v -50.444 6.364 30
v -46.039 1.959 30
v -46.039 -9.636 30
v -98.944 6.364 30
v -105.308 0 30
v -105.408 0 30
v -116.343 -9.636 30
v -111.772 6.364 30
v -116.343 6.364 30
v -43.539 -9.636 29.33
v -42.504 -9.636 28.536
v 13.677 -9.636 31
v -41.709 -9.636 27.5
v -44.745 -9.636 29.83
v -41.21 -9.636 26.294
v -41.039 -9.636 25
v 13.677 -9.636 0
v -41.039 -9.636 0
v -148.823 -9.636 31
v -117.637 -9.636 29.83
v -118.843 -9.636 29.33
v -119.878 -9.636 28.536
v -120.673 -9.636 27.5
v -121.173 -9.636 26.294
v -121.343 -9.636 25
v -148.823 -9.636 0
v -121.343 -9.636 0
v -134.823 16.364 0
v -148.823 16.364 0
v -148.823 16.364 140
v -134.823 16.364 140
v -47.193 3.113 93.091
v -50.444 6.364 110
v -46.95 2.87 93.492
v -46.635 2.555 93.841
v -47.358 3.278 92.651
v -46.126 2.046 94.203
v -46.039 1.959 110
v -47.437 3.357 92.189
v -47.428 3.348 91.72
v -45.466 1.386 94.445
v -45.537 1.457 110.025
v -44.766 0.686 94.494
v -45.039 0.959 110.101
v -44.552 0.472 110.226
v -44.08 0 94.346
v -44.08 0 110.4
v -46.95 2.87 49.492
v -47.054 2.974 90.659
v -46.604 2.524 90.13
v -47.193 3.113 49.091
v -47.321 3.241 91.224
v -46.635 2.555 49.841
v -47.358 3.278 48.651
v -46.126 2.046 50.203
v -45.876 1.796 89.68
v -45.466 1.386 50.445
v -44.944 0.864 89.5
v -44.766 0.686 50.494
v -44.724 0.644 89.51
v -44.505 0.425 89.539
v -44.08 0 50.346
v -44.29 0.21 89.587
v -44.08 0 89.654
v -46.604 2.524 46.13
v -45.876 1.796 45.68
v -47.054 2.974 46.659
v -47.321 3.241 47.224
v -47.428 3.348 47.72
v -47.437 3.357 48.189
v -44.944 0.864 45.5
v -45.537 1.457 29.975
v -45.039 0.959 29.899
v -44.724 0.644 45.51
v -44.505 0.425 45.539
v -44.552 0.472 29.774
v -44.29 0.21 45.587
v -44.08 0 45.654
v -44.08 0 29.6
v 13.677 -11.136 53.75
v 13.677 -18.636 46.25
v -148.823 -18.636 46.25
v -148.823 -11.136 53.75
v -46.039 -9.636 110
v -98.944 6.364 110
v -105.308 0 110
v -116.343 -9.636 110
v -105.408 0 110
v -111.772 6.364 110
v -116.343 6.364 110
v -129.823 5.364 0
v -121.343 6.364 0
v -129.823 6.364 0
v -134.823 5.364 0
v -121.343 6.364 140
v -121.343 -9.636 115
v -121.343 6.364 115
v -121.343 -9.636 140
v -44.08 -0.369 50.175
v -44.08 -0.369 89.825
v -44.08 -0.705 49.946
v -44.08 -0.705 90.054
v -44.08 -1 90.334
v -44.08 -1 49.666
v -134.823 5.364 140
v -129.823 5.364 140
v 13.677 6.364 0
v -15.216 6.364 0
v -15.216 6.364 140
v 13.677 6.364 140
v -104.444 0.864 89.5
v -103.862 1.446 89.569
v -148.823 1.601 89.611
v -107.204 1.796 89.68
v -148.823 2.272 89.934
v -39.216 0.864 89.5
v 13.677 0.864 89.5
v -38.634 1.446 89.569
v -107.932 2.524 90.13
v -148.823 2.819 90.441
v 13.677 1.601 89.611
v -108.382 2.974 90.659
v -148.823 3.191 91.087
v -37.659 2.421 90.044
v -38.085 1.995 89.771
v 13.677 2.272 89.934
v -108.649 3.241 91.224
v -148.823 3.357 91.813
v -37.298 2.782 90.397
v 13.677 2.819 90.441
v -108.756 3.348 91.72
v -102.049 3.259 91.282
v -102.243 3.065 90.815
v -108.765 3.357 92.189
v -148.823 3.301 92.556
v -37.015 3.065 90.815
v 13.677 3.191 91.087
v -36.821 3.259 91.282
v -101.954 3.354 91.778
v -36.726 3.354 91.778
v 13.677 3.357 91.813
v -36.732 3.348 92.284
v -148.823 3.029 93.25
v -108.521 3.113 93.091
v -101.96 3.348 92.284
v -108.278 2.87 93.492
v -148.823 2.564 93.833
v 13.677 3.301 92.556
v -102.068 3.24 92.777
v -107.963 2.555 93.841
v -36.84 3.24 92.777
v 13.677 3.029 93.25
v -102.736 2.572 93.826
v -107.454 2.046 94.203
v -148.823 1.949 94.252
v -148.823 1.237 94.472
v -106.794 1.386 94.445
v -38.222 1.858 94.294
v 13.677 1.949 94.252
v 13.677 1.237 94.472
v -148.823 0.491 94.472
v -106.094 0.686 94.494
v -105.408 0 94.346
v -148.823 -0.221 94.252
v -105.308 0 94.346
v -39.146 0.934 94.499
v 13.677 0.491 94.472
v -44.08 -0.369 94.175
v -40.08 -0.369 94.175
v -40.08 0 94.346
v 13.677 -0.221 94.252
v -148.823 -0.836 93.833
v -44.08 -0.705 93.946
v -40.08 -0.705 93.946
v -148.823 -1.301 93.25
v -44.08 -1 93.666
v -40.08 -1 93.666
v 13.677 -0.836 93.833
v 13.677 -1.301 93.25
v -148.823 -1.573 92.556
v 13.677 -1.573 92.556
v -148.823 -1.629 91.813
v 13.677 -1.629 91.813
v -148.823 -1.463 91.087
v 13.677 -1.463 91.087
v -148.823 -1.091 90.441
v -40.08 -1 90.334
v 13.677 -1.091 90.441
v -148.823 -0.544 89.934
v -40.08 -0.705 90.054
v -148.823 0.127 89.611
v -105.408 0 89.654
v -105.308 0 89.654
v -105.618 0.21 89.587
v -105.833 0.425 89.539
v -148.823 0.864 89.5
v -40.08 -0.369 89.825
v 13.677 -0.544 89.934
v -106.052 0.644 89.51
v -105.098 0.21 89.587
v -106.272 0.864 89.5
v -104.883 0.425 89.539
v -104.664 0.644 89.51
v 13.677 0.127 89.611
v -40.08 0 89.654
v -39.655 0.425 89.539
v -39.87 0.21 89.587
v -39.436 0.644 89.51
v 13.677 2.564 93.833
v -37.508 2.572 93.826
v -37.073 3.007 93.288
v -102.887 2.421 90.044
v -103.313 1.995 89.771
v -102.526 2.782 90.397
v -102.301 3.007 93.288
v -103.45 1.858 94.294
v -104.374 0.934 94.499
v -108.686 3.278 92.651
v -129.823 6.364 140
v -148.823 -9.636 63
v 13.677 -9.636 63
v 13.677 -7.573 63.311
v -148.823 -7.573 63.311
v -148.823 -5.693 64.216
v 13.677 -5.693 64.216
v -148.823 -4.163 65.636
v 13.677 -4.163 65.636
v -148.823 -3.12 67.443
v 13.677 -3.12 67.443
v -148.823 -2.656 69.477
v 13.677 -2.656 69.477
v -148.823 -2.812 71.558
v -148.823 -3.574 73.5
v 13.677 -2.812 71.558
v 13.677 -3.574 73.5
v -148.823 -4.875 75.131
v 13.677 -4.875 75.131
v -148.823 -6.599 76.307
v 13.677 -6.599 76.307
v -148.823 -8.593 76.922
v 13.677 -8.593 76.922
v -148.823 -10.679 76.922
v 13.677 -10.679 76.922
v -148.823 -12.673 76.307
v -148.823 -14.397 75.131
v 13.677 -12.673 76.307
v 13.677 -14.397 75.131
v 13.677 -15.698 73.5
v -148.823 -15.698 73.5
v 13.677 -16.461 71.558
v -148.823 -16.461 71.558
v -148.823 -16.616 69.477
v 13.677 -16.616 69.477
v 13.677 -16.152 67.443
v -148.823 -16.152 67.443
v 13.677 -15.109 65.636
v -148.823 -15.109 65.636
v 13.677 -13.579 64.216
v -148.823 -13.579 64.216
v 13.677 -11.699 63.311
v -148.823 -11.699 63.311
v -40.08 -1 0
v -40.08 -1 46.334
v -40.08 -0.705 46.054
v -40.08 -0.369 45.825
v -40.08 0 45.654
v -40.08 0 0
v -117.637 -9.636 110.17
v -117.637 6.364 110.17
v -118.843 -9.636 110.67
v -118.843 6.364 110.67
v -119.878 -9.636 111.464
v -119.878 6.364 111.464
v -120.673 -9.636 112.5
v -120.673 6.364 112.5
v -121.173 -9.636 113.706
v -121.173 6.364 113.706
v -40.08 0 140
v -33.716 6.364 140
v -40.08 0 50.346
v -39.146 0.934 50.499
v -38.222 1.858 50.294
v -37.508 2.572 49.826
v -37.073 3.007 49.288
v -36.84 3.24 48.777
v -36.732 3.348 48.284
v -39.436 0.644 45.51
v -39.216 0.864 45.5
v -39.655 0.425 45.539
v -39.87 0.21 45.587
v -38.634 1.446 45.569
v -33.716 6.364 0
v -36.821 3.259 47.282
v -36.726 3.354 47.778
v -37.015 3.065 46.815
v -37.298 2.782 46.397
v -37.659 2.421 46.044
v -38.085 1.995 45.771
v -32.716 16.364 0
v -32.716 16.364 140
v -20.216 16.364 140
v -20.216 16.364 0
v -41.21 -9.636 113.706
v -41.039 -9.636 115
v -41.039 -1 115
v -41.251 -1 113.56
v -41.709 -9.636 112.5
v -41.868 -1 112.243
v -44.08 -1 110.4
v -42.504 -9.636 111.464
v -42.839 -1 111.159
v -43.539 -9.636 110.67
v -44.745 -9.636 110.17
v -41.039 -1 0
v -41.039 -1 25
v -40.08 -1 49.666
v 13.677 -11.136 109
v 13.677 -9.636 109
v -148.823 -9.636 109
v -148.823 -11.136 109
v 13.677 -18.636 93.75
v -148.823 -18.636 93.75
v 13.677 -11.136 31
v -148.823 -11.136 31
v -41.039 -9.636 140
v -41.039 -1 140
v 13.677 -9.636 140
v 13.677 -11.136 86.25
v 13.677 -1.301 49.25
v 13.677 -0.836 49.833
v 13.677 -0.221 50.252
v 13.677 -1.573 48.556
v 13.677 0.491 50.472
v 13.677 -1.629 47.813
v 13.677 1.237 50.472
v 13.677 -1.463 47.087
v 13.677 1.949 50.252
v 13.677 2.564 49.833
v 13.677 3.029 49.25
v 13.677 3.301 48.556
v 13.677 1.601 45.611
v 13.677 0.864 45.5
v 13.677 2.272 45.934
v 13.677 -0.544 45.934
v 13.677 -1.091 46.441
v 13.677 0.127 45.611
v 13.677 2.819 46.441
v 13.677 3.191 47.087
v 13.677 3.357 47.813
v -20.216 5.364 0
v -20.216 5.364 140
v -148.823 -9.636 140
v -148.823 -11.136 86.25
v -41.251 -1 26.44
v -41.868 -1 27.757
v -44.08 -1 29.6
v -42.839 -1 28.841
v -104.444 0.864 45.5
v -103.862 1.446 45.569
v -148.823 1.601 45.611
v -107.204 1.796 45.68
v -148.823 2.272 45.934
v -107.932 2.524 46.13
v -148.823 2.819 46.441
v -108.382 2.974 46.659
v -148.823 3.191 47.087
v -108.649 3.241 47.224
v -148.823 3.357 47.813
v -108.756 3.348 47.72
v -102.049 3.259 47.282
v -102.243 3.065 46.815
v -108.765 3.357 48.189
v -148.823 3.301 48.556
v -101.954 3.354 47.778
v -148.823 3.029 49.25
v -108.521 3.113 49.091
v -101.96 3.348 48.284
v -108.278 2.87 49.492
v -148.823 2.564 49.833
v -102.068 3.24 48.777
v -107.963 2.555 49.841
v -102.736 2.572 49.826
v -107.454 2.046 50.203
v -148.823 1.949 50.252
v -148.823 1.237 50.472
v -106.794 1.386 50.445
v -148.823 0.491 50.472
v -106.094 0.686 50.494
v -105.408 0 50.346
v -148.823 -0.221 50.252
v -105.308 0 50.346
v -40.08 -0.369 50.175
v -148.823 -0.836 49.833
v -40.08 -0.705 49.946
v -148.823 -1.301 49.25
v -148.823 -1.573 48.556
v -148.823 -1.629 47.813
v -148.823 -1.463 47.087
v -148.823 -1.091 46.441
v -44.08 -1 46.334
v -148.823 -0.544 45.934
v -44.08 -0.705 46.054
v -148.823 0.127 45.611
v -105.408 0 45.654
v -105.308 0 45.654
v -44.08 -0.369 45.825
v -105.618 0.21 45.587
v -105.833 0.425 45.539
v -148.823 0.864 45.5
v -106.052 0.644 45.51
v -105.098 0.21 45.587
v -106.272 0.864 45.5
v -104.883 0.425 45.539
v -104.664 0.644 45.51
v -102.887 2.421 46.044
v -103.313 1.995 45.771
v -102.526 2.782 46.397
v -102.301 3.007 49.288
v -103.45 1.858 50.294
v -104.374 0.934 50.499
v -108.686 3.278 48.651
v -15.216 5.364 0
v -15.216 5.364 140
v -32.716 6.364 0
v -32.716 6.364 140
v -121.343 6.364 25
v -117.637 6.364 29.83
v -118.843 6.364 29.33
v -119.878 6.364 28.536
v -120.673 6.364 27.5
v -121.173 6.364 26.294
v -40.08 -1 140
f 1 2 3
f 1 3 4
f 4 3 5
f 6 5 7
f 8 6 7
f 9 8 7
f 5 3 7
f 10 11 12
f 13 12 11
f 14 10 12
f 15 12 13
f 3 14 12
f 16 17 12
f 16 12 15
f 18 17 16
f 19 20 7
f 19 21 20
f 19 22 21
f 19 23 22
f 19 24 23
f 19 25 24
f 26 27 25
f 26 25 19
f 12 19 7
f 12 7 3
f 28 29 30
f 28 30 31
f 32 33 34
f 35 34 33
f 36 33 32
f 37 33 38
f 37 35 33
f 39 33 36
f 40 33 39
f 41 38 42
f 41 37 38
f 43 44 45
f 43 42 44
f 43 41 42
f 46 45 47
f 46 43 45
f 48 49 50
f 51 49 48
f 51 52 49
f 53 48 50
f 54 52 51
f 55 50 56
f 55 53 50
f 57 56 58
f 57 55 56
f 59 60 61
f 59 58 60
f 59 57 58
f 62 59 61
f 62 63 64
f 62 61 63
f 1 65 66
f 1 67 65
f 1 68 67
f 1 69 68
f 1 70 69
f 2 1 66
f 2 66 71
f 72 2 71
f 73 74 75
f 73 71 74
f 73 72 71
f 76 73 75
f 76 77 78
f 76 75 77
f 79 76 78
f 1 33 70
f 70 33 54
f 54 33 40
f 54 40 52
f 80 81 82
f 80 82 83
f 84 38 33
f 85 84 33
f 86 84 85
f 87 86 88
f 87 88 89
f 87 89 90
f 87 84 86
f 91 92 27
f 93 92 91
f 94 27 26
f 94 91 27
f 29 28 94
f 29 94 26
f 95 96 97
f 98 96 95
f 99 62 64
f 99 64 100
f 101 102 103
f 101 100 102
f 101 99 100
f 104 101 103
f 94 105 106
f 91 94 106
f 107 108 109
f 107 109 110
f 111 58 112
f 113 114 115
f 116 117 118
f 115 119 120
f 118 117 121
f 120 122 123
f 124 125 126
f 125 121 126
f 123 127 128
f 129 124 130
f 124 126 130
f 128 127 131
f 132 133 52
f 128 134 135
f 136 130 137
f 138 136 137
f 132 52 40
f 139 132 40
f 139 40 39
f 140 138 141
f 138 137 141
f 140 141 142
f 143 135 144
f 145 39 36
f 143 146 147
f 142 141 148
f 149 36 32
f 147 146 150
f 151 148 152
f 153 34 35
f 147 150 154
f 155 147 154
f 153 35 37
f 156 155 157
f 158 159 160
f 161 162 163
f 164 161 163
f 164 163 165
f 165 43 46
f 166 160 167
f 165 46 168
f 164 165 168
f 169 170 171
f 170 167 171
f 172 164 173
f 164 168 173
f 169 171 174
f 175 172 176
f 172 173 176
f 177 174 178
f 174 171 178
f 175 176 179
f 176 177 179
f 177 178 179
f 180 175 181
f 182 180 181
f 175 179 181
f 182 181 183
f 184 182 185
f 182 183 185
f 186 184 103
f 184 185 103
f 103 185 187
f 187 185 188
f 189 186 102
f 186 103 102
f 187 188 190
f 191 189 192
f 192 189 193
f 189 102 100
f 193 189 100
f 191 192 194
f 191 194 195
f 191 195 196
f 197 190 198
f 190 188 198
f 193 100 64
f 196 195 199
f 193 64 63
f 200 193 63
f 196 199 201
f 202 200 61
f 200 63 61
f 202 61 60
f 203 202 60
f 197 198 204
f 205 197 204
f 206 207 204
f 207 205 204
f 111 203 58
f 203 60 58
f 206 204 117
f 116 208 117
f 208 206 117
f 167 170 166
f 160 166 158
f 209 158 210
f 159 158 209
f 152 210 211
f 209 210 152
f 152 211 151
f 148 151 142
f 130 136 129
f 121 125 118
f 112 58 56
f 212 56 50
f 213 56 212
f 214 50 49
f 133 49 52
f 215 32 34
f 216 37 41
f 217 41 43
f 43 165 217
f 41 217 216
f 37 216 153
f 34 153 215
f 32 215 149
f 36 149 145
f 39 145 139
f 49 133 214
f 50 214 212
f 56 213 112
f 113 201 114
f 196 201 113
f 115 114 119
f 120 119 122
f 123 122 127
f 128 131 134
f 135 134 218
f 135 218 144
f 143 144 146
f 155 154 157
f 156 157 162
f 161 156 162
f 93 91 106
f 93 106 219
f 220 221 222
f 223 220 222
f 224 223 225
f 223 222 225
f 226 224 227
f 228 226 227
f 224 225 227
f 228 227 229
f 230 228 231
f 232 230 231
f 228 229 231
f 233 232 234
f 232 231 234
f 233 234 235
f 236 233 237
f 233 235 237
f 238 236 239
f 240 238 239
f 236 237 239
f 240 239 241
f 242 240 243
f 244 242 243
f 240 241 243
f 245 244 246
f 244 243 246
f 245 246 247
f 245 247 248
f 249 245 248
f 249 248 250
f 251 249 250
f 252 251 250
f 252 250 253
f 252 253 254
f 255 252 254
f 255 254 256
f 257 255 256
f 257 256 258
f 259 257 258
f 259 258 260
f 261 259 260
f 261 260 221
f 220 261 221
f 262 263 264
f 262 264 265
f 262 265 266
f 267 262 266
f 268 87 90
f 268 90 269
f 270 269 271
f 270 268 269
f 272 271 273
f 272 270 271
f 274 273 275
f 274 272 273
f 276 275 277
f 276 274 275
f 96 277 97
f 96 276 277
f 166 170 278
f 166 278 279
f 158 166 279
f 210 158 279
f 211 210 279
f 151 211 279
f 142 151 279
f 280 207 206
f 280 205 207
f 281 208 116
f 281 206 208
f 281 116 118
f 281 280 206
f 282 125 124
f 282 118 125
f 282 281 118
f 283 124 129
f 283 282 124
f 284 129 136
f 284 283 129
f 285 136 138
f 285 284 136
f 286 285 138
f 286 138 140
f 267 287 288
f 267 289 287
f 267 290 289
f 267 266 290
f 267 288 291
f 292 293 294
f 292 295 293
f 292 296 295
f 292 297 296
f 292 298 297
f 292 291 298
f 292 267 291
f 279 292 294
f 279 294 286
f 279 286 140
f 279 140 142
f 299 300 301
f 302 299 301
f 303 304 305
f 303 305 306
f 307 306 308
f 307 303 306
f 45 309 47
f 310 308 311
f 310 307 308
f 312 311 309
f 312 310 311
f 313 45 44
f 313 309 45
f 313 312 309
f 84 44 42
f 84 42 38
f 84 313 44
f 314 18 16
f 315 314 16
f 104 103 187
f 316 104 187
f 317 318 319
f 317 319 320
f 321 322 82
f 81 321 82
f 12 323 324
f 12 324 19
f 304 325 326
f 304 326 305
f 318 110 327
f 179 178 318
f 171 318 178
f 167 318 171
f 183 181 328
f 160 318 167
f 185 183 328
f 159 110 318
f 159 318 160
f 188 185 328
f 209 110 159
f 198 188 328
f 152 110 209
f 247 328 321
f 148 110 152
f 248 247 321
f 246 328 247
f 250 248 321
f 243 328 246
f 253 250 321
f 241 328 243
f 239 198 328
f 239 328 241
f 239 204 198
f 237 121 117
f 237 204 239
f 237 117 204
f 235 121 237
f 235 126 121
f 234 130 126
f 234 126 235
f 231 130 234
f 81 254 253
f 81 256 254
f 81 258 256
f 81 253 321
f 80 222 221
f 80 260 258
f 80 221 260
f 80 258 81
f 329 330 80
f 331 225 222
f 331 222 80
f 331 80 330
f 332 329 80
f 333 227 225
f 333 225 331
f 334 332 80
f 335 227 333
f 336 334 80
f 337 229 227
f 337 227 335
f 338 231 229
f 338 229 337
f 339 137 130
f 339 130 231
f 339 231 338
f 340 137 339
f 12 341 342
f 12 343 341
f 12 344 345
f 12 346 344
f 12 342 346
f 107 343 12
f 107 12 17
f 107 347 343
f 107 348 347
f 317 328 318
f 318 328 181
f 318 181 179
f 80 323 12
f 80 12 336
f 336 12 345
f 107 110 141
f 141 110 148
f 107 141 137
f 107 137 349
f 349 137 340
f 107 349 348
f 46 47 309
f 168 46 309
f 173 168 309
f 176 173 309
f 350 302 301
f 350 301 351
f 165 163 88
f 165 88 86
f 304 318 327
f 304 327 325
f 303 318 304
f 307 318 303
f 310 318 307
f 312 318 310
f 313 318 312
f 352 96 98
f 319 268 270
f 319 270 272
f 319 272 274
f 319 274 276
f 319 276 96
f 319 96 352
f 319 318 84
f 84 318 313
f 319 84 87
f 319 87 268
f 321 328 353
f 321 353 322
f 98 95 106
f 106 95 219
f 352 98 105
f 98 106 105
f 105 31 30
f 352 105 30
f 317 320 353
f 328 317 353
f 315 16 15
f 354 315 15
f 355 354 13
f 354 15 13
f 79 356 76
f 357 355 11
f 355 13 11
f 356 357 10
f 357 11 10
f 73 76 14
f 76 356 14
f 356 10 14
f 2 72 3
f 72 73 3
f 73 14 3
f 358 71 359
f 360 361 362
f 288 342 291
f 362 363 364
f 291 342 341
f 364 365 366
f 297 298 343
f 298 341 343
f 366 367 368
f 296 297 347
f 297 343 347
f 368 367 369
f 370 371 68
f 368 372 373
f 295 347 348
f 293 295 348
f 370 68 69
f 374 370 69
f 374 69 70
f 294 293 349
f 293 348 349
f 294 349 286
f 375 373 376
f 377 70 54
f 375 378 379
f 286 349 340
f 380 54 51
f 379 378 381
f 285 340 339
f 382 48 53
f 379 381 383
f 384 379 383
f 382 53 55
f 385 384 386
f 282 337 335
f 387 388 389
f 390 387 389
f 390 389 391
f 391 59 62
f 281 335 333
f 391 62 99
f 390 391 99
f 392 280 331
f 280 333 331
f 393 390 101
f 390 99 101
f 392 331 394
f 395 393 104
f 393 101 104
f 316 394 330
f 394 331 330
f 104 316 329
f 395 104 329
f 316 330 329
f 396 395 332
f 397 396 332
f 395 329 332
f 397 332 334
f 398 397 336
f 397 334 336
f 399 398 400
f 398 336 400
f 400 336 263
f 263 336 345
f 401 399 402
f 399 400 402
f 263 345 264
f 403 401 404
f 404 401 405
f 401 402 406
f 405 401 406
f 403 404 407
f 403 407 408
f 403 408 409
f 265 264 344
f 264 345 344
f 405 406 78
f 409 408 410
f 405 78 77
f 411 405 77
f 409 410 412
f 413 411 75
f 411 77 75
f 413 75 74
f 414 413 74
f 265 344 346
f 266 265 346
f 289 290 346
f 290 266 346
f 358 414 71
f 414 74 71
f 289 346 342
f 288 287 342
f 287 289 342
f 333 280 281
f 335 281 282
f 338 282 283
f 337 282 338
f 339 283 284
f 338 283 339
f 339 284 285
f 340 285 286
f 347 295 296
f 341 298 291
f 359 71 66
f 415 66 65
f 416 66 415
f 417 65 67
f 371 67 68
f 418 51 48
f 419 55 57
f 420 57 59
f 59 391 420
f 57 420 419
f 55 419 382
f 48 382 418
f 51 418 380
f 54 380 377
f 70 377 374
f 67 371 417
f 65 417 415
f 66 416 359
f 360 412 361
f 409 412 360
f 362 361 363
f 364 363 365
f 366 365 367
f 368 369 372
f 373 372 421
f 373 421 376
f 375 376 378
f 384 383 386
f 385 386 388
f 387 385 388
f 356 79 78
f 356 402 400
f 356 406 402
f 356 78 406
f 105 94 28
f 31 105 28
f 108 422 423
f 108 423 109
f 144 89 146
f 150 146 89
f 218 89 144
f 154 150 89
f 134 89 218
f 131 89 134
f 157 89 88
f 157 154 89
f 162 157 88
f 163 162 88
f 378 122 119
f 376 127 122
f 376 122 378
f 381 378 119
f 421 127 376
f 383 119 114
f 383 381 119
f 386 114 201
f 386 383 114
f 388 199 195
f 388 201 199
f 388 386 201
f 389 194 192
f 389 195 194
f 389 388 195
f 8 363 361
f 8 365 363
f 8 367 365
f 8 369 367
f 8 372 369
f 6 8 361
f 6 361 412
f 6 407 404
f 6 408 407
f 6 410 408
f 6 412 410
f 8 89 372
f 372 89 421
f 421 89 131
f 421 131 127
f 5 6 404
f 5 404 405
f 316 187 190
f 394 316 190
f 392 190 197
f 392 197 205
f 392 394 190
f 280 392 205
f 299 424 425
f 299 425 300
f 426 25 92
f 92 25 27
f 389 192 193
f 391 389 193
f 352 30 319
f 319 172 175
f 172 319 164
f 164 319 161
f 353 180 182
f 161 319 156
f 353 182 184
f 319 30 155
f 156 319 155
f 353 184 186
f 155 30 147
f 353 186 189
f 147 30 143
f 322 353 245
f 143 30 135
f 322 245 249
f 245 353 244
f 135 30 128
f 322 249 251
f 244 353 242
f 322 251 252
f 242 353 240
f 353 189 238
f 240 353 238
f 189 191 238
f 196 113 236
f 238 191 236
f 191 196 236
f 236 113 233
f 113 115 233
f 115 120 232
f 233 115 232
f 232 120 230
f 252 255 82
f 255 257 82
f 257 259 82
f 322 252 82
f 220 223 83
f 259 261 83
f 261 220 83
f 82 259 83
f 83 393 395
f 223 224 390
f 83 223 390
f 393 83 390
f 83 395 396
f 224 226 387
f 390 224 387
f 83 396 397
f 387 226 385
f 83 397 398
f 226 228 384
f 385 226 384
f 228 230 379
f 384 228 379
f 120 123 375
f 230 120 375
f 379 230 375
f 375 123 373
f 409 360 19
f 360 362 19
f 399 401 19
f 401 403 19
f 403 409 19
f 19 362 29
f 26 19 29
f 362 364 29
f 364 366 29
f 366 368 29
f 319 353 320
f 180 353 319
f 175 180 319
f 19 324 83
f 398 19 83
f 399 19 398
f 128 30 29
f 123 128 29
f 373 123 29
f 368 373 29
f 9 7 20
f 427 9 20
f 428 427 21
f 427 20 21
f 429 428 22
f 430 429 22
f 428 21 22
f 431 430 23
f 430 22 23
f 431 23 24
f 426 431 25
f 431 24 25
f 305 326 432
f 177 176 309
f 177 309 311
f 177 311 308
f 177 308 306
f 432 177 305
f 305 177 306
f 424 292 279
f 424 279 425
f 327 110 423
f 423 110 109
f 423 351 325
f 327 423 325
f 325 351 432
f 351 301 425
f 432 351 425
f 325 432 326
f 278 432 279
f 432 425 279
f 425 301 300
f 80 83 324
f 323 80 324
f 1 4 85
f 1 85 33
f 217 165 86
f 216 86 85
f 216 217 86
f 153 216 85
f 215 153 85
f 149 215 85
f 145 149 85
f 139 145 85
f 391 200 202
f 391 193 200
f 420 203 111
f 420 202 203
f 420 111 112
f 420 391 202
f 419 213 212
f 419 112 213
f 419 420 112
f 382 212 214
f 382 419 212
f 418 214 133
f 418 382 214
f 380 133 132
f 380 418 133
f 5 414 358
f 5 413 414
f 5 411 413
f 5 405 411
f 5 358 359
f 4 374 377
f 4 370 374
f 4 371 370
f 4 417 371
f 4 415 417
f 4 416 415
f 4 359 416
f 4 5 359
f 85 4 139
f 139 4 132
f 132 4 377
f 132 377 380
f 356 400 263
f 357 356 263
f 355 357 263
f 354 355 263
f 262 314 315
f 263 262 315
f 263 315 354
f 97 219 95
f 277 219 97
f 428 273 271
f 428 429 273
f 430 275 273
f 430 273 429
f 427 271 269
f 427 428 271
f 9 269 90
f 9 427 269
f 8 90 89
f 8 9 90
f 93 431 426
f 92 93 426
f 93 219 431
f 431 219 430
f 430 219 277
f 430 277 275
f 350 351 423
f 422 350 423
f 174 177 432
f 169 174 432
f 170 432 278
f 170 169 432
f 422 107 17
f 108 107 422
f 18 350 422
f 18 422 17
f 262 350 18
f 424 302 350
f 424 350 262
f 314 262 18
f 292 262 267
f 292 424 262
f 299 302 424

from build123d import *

# Parameters (mm, degrees)
BOSS_EXTRUDE1_DEPTH = 140
BOSS_EXTRUDE2_DEPTH = 162.5
CUT_EXTRUDE1_DEPTH  = 100
SKETCH4_R           = 7
CUT_EXTRUDE2_DEPTH  = 1000
SKETCH5_R           = 2.5
CUT_EXTRUDE3_DEPTH  = 1000


with BuildPart() as part:
    # Sketch1 → Boss-Extrude1 (new body)
    with BuildSketch(Plane.XY):
        Polygon((-148.823444479, 16.363961031), (-134.823444479, 16.363961031), (-134.823444479, 6.363961031), (-134.823444479, 5.363961031), (-129.823444479, 5.363961031), (-129.823444479, 6.363961031), (-111.771895875, 6.363961031), (-105.407934844, 0), (-105.307934844, 0), (-98.943973814, 6.363961031), (-50.443973814, 6.363961031), (-44.080012783, 0), (-44.080012783, -1), (-40.080012783, -1), (-40.080012783, 0), (-33.716051752, 6.363961031), (-32.716051752, 6.363961031), (-32.716051752, 16.363961031), (-20.216051752, 16.363961031), (-20.216051752, 5.363961031), (-15.216051752, 5.363961031), (-15.216051752, 6.363961031), (13.676555521, 6.363961031), (13.676555521, -9.636038969), (-148.823444479, -9.636038969), align=None)
    extrude(amount=BOSS_EXTRUDE1_DEPTH)

    # Sketch2 → Boss-Extrude2 (add)
    with BuildSketch(Plane(origin=(13.676555521, 0, 0), x_dir=(0, 0, -1), z_dir=(1, 0, 0))):
        Polygon((-86.25, -11.136038969), (-93.75, -18.636038969), (-46.25, -18.636038969), (-53.75, -11.136038969), (-31, -11.136038969), (-31, -8.713113528), (-109, -8.713113528), (-109, -11.136038969), align=None)
    extrude(amount=-BOSS_EXTRUDE2_DEPTH)

    # Sketch3 → Cut-Extrude1 (cut)
    with BuildSketch(Plane.XZ.offset(9.636038969)):
        with BuildLine():
            Line((-121.342924919, 0), (-41.039209534, 0))
            Line((-41.039209534, 0), (-41.039209534, 25))
            ThreePointArc((-41.039209534, 25), (-42.503675628, 28.535533906), (-46.039209534, 30))
            Line((-46.039209534, 30), (-116.342924919, 30))
            ThreePointArc((-116.342924919, 30), (-119.878458825, 28.535533906), (-121.342924919, 25))
            Line((-121.342924919, 25), (-121.342924919, 0))
        make_face()
        with BuildLine():
            Line((-121.342924919, 140), (-41.039209534, 140))
            Line((-41.039209534, 140), (-41.039209534, 115))
            ThreePointArc((-41.039209534, 115), (-42.503675628, 111.464466094), (-46.039209534, 110))
            Line((-46.039209534, 110), (-116.342924919, 110))
            ThreePointArc((-116.342924919, 110), (-119.878458825, 111.464466094), (-121.342924919, 115))
            Line((-121.342924919, 115), (-121.342924919, 140))
        make_face()
    extrude(amount=-CUT_EXTRUDE1_DEPTH, mode=Mode.SUBTRACT)

    # Sketch4 → Cut-Extrude2 (cut)
    with BuildSketch(Plane(origin=(13.676555521, 0, 0), x_dir=(0, 0, -1), z_dir=(1, 0, 0))):
        with Locations((-70, -9.636038969)):
            Circle(SKETCH4_R)
    extrude(amount=-CUT_EXTRUDE2_DEPTH, mode=Mode.SUBTRACT)

    # Sketch5 → Cut-Extrude3 (cut)
    with BuildSketch(Plane(origin=(13.676555521, 0, 0), x_dir=(0, 0, -1), z_dir=(1, 0, 0))):
        with Locations((-92, 0.863961031)):
            Circle(SKETCH5_R)
        with Locations((-48, 0.863961031)):
            Circle(SKETCH5_R)
    extrude(amount=-CUT_EXTRUDE3_DEPTH, mode=Mode.SUBTRACT)


solid = part.part
